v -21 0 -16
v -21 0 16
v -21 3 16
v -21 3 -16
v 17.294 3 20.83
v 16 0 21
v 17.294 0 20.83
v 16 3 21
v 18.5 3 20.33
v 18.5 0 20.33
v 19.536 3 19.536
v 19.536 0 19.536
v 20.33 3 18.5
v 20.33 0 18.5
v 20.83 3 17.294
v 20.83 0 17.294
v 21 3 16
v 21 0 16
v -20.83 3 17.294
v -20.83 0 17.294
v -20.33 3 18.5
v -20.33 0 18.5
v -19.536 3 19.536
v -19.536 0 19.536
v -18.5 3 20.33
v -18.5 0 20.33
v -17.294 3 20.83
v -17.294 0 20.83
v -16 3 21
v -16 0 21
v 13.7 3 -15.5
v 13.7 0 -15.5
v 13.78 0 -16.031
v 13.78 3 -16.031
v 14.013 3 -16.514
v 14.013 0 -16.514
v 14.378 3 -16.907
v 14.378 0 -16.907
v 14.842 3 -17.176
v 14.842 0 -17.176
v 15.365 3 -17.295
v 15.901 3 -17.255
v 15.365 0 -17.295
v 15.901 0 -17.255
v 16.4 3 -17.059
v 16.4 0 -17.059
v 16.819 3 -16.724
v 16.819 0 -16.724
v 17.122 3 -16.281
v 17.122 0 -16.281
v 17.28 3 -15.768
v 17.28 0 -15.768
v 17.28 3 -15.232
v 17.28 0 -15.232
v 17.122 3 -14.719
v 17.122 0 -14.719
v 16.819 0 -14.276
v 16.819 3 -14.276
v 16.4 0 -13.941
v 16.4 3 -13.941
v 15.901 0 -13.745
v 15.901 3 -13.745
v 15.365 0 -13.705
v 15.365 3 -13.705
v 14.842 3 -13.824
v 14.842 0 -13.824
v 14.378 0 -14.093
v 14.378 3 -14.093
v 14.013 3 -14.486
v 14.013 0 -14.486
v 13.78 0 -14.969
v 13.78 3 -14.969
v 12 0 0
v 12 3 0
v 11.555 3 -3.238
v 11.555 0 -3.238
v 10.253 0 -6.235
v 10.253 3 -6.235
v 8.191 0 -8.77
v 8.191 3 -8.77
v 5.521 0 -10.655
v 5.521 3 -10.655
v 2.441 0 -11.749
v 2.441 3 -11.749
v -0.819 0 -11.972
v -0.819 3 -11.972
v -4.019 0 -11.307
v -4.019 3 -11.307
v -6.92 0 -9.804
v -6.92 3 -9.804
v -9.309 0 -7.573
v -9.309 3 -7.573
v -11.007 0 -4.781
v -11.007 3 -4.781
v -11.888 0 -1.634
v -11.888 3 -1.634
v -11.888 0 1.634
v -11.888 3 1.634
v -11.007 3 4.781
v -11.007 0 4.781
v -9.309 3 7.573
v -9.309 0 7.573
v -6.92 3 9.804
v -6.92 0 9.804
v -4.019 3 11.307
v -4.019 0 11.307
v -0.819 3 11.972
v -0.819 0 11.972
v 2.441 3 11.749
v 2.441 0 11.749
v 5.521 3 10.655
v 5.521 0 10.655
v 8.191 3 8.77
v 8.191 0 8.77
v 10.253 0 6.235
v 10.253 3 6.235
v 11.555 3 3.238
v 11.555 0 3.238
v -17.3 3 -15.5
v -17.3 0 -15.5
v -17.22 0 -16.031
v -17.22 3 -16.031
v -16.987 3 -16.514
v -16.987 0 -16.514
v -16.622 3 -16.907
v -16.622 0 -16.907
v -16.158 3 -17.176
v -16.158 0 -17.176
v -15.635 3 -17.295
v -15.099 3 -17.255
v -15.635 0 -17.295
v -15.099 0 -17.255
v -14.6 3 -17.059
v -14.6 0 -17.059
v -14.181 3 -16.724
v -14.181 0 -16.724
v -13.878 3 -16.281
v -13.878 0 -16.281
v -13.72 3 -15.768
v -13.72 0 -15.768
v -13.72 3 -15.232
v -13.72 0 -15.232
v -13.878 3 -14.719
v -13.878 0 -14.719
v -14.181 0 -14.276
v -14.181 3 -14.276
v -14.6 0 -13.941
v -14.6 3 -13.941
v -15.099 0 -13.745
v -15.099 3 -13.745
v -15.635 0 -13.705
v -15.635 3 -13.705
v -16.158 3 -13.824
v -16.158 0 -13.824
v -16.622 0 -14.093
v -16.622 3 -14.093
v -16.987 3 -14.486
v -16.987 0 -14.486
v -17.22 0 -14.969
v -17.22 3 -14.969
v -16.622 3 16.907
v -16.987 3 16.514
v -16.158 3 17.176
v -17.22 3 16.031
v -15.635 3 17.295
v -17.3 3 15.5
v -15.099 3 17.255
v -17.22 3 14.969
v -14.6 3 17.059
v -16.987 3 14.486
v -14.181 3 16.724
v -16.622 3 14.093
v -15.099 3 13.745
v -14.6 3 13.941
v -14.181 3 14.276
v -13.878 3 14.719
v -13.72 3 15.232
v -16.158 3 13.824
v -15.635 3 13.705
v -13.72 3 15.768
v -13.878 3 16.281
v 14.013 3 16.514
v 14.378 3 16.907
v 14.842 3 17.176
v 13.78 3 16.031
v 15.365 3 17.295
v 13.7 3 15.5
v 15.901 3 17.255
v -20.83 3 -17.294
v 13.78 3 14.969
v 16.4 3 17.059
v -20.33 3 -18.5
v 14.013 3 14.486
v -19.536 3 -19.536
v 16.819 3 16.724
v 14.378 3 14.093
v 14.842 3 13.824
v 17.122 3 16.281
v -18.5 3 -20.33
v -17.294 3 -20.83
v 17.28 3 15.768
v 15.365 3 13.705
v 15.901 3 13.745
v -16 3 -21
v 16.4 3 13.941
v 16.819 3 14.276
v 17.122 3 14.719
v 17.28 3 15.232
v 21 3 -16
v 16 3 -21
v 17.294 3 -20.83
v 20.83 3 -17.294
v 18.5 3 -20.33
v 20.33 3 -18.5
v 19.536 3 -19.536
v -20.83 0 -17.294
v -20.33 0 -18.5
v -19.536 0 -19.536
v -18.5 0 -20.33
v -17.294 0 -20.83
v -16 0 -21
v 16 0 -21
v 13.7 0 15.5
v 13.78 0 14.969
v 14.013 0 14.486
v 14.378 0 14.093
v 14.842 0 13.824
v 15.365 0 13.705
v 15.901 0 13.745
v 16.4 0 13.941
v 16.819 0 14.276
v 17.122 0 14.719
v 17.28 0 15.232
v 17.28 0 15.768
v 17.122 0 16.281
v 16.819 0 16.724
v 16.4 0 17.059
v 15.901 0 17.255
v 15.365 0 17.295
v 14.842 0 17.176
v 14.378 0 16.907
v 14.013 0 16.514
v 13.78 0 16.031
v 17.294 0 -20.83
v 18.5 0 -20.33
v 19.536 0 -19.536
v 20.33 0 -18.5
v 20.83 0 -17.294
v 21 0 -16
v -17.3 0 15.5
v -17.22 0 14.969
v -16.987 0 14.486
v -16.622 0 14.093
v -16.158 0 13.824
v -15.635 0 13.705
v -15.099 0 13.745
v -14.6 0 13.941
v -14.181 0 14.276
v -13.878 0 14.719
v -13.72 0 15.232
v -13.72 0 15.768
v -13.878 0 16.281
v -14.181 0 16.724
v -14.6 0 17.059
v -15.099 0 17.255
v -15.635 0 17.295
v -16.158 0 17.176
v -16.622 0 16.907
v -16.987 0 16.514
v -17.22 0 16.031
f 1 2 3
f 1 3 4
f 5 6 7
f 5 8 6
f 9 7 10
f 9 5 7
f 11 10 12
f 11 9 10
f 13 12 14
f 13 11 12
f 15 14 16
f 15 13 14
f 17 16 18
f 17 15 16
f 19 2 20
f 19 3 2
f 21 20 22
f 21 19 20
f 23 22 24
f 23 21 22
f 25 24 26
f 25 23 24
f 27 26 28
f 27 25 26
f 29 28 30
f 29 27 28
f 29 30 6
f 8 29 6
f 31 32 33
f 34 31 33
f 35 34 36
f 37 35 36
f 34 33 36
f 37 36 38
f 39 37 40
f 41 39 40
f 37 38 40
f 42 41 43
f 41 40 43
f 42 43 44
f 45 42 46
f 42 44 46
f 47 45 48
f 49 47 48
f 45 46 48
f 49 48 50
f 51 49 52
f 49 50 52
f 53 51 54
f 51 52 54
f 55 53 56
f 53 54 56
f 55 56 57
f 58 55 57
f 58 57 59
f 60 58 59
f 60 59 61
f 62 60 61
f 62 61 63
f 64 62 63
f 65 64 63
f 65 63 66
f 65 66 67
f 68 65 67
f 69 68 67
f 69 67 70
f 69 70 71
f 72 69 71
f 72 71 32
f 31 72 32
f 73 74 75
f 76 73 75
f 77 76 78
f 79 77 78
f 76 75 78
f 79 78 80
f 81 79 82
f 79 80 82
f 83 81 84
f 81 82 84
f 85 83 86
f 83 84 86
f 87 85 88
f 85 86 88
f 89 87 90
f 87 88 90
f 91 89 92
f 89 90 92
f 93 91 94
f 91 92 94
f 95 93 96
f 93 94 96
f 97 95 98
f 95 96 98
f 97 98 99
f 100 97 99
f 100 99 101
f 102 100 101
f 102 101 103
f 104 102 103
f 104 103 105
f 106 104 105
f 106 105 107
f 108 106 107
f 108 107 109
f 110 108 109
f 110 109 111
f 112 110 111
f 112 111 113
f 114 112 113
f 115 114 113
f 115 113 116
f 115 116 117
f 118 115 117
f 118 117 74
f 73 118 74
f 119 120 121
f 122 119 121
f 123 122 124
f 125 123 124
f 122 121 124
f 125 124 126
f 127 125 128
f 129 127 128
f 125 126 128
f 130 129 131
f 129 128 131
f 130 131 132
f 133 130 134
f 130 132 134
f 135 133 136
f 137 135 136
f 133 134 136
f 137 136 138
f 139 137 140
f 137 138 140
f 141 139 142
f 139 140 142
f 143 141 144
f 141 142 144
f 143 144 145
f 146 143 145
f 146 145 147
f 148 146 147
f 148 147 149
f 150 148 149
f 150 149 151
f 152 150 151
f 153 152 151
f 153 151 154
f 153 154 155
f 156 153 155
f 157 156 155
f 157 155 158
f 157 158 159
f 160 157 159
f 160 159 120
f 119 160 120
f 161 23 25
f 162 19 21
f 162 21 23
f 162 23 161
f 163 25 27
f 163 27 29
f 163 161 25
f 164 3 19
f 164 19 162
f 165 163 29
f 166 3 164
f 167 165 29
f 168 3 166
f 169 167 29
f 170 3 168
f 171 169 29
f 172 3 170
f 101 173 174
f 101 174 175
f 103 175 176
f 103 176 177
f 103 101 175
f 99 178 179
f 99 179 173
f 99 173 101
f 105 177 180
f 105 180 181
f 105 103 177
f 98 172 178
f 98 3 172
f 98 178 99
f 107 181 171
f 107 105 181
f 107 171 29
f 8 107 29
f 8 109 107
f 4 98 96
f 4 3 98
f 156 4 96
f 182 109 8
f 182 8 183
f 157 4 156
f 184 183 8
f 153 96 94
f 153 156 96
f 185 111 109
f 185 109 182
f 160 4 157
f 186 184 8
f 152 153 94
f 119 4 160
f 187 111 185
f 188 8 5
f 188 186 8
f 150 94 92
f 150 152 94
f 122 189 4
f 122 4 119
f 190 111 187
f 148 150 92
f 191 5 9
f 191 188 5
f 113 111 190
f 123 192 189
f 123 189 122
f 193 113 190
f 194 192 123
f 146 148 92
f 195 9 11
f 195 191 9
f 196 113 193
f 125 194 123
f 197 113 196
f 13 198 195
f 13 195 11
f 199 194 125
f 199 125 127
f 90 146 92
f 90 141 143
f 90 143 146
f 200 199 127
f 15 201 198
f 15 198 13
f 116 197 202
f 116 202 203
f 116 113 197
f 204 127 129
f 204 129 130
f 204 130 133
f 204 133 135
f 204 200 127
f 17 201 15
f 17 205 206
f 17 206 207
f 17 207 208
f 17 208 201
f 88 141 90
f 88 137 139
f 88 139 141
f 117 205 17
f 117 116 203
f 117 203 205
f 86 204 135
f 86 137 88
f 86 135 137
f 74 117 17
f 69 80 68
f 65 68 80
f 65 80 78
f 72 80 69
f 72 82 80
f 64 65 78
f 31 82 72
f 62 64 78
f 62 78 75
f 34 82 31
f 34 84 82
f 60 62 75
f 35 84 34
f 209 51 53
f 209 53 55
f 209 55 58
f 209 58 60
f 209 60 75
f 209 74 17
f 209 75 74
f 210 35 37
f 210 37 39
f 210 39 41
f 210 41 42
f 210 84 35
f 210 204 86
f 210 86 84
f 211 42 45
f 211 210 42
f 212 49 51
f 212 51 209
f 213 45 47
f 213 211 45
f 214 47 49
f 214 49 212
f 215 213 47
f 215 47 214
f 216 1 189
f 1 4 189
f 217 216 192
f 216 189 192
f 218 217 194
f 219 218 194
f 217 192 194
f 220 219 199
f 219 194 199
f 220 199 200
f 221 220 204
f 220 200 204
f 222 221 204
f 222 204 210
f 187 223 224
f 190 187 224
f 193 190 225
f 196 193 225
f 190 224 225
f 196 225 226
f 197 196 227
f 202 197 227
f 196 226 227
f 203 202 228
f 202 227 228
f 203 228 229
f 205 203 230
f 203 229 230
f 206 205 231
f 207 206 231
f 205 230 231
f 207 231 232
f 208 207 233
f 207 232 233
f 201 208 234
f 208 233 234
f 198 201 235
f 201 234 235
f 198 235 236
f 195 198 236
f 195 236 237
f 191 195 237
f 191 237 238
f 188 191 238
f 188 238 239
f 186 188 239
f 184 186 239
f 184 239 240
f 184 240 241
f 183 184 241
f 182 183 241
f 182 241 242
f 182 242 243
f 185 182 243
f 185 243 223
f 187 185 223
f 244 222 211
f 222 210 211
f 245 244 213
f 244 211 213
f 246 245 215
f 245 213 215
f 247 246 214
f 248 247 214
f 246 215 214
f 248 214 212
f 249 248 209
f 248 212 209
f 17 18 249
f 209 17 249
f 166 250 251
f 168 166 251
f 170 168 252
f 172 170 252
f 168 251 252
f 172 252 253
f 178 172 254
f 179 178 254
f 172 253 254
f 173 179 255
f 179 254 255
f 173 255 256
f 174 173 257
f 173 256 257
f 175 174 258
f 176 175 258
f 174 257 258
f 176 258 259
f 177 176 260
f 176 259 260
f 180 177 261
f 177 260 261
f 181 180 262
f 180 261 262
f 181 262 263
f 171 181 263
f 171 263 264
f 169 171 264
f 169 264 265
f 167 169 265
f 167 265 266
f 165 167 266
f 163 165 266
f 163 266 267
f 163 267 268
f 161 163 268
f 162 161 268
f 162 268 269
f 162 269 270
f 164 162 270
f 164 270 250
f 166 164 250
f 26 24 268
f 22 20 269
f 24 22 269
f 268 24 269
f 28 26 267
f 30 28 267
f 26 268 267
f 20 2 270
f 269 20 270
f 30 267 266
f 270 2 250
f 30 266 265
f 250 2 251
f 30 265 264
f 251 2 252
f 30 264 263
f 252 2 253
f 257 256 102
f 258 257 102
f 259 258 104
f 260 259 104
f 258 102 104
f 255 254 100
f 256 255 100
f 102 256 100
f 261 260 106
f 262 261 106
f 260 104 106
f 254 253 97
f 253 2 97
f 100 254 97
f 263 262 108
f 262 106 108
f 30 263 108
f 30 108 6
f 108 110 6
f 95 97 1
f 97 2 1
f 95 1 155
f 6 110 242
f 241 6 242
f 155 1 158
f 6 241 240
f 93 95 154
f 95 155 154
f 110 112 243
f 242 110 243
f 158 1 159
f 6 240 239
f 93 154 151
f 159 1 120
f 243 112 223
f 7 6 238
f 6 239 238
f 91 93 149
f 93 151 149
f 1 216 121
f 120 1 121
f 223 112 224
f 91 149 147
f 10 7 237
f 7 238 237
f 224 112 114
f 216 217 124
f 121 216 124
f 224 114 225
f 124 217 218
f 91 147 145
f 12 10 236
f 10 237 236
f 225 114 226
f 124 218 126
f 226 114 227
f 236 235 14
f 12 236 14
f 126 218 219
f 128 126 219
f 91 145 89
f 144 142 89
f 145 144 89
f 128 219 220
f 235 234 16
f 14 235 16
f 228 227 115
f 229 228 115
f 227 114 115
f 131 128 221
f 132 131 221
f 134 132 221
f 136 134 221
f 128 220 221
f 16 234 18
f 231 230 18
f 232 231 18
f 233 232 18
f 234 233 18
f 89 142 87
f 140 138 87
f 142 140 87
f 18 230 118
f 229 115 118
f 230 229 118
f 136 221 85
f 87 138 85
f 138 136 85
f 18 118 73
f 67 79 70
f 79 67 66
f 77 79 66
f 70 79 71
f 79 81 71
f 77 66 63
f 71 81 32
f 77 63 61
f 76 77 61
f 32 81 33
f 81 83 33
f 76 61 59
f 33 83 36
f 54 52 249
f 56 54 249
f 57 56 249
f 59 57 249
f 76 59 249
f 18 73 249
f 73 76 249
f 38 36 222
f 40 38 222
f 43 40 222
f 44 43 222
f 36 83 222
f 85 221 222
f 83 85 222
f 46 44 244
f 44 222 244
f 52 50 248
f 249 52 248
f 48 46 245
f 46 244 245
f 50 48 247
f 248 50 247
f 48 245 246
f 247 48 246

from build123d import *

# Parameters (mm, degrees)
SKETCH1_W            = 42
SKETCH1_H            = 42
BOSS_EXTRUDE1_DEPTH  = 3
M3_CLEARANCE_HOLE1_D = 3.6
SKETCH4_R            = 12
CUT_EXTRUDE1_DEPTH   = 4
FILLET1_R            = 5


with BuildPart() as part:
    # Sketch1 → Boss-Extrude1 (new body)
    with BuildSketch(Plane(origin=(0, 0, 0), x_dir=(1, 0, 0), z_dir=(0, 1, 0))):
        Rectangle(SKETCH1_W, SKETCH1_H)
    extrude(amount=BOSS_EXTRUDE1_DEPTH)

    # M3 Clearance Hole1 (through all)
    with Locations(Plane(origin=(0, 3, 0), x_dir=(1, 0, 0), z_dir=(0, 1, 0))):
        with Locations((-15.5, 15.5), (-15.5, -15.5), (15.5, -15.5), (15.5, 15.5)):
            Hole(M3_CLEARANCE_HOLE1_D / 2)

    # Sketch4 → Cut-Extrude1 (cut, through all)
    with BuildSketch(Plane(origin=(0, 3, 0), x_dir=(1, 0, 0), z_dir=(0, 1, 0))):
        Circle(SKETCH4_R)
    extrude(amount=-CUT_EXTRUDE1_DEPTH, mode=Mode.SUBTRACT)

    # Fillet1
    fillet1_edges = [part.edges().sort_by_distance(p)[0] for p in [
        (-21, 1.5, -21),
        (21, 1.5, -21),
        (21, 1.5, 21),
        (-21, 1.5, 21),
    ]]
    fillet(fillet1_edges, radius=FILLET1_R)


solid = part.part
